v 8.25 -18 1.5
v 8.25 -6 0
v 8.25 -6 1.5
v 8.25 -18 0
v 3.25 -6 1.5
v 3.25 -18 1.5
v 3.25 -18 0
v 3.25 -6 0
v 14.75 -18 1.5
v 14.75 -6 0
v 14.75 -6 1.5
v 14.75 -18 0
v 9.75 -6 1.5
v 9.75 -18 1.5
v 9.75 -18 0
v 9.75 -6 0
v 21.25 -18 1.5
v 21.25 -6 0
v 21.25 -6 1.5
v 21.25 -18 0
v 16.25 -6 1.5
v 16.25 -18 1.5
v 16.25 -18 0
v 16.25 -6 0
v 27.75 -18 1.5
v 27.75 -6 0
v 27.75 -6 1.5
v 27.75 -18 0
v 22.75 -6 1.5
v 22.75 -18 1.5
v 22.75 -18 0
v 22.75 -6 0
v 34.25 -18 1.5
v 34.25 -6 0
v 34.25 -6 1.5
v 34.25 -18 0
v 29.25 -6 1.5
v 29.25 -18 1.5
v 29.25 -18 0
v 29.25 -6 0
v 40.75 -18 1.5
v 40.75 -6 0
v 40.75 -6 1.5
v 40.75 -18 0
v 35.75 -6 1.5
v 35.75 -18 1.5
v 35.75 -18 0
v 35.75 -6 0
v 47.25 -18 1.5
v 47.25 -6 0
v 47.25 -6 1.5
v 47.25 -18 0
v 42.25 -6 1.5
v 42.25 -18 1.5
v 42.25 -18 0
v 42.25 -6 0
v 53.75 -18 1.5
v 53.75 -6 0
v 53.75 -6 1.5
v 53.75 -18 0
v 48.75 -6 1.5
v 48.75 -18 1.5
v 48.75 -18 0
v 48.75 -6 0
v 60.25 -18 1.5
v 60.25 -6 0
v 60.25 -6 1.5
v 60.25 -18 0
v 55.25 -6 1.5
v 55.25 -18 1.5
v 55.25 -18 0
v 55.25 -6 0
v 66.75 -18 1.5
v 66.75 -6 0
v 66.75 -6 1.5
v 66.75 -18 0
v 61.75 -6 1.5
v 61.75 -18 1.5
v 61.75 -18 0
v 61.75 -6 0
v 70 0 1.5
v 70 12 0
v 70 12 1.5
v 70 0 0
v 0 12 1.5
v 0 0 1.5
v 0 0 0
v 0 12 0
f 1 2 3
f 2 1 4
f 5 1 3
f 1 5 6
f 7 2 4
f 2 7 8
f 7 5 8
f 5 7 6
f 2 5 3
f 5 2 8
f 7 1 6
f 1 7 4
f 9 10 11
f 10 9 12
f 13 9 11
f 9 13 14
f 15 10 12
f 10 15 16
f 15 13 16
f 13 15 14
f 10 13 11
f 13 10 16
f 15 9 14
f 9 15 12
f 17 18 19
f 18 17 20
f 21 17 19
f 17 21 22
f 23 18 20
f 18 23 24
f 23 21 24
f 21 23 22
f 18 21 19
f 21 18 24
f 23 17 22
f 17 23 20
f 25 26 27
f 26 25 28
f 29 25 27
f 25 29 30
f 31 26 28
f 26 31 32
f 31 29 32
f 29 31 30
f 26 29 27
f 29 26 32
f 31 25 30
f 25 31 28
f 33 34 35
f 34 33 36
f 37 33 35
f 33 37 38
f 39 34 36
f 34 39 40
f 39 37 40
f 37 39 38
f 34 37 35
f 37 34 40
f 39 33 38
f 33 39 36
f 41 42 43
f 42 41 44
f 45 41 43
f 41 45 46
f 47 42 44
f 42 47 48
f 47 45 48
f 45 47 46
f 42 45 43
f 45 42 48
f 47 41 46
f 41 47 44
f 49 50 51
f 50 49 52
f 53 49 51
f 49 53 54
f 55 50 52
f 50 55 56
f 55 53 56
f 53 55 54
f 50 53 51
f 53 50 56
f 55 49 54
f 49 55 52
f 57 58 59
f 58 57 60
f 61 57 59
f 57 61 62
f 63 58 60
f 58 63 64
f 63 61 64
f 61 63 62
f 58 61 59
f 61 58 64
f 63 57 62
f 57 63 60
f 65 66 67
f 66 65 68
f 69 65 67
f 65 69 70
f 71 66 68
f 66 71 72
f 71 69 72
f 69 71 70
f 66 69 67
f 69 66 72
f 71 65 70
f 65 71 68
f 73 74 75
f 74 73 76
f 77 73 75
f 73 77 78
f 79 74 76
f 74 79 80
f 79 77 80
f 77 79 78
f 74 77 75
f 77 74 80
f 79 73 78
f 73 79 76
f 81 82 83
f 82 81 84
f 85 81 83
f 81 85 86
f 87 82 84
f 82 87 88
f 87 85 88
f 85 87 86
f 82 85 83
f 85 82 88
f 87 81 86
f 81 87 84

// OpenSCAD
// 10-well agarose gel comb
// Print orientation: lying flat on XY plane, z=0

// Overall plate dimensions
plate_thickness = 1.5;    // Z thickness (mm)
spine_length = 70;         // X length (mm)
spine_width = 12;          // Y width (mm)

// Tooth dimensions
tooth_width = 5.0;         // X width (mm)
tooth_length = 12;         // Y length (mm) (extends in -Y from spine edge)

// Gap between teeth
gap_width = 1.5;           // X gap (mm)

// Number of teeth
num_teeth = 10;

// Calculate total width of teeth + gaps
total_tooth_width = num_teeth * tooth_width;
total_gap_width = (num_teeth - 1) * gap_width;
total_tooth_group_width = total_tooth_width + total_gap_width;

// Center the tooth group on the spine in X
tooth_group_offset_x = (spine_length - total_tooth_group_width) / 2;

// Position of first tooth in X (relative to origin)
first_tooth_x = tooth_group_offset_x;

// Spine extends in +Y from center, teeth hang in -Y
// Spine Y range: [-spine_width/2, spine_width/2]
// Teeth start at spine bottom edge: y = -spine_width/2
// Teeth extend to: y = -spine_width/2 - tooth_length

$fn = 64;

// Main spine plate
union() {
    // Spine body - centered at origin
    translate([0, 0, 0])
        cube([spine_length, spine_width, plate_thickness], center = false);
    
    // Add teeth
    for (i = [0 : num_teeth - 1]) {
        tooth_x = first_tooth_x + i * (tooth_width + gap_width);
        translate([tooth_x, -spine_width/2 - tooth_length, 0])
            cube([tooth_width, tooth_length, plate_thickness], center = false);
    }
}
